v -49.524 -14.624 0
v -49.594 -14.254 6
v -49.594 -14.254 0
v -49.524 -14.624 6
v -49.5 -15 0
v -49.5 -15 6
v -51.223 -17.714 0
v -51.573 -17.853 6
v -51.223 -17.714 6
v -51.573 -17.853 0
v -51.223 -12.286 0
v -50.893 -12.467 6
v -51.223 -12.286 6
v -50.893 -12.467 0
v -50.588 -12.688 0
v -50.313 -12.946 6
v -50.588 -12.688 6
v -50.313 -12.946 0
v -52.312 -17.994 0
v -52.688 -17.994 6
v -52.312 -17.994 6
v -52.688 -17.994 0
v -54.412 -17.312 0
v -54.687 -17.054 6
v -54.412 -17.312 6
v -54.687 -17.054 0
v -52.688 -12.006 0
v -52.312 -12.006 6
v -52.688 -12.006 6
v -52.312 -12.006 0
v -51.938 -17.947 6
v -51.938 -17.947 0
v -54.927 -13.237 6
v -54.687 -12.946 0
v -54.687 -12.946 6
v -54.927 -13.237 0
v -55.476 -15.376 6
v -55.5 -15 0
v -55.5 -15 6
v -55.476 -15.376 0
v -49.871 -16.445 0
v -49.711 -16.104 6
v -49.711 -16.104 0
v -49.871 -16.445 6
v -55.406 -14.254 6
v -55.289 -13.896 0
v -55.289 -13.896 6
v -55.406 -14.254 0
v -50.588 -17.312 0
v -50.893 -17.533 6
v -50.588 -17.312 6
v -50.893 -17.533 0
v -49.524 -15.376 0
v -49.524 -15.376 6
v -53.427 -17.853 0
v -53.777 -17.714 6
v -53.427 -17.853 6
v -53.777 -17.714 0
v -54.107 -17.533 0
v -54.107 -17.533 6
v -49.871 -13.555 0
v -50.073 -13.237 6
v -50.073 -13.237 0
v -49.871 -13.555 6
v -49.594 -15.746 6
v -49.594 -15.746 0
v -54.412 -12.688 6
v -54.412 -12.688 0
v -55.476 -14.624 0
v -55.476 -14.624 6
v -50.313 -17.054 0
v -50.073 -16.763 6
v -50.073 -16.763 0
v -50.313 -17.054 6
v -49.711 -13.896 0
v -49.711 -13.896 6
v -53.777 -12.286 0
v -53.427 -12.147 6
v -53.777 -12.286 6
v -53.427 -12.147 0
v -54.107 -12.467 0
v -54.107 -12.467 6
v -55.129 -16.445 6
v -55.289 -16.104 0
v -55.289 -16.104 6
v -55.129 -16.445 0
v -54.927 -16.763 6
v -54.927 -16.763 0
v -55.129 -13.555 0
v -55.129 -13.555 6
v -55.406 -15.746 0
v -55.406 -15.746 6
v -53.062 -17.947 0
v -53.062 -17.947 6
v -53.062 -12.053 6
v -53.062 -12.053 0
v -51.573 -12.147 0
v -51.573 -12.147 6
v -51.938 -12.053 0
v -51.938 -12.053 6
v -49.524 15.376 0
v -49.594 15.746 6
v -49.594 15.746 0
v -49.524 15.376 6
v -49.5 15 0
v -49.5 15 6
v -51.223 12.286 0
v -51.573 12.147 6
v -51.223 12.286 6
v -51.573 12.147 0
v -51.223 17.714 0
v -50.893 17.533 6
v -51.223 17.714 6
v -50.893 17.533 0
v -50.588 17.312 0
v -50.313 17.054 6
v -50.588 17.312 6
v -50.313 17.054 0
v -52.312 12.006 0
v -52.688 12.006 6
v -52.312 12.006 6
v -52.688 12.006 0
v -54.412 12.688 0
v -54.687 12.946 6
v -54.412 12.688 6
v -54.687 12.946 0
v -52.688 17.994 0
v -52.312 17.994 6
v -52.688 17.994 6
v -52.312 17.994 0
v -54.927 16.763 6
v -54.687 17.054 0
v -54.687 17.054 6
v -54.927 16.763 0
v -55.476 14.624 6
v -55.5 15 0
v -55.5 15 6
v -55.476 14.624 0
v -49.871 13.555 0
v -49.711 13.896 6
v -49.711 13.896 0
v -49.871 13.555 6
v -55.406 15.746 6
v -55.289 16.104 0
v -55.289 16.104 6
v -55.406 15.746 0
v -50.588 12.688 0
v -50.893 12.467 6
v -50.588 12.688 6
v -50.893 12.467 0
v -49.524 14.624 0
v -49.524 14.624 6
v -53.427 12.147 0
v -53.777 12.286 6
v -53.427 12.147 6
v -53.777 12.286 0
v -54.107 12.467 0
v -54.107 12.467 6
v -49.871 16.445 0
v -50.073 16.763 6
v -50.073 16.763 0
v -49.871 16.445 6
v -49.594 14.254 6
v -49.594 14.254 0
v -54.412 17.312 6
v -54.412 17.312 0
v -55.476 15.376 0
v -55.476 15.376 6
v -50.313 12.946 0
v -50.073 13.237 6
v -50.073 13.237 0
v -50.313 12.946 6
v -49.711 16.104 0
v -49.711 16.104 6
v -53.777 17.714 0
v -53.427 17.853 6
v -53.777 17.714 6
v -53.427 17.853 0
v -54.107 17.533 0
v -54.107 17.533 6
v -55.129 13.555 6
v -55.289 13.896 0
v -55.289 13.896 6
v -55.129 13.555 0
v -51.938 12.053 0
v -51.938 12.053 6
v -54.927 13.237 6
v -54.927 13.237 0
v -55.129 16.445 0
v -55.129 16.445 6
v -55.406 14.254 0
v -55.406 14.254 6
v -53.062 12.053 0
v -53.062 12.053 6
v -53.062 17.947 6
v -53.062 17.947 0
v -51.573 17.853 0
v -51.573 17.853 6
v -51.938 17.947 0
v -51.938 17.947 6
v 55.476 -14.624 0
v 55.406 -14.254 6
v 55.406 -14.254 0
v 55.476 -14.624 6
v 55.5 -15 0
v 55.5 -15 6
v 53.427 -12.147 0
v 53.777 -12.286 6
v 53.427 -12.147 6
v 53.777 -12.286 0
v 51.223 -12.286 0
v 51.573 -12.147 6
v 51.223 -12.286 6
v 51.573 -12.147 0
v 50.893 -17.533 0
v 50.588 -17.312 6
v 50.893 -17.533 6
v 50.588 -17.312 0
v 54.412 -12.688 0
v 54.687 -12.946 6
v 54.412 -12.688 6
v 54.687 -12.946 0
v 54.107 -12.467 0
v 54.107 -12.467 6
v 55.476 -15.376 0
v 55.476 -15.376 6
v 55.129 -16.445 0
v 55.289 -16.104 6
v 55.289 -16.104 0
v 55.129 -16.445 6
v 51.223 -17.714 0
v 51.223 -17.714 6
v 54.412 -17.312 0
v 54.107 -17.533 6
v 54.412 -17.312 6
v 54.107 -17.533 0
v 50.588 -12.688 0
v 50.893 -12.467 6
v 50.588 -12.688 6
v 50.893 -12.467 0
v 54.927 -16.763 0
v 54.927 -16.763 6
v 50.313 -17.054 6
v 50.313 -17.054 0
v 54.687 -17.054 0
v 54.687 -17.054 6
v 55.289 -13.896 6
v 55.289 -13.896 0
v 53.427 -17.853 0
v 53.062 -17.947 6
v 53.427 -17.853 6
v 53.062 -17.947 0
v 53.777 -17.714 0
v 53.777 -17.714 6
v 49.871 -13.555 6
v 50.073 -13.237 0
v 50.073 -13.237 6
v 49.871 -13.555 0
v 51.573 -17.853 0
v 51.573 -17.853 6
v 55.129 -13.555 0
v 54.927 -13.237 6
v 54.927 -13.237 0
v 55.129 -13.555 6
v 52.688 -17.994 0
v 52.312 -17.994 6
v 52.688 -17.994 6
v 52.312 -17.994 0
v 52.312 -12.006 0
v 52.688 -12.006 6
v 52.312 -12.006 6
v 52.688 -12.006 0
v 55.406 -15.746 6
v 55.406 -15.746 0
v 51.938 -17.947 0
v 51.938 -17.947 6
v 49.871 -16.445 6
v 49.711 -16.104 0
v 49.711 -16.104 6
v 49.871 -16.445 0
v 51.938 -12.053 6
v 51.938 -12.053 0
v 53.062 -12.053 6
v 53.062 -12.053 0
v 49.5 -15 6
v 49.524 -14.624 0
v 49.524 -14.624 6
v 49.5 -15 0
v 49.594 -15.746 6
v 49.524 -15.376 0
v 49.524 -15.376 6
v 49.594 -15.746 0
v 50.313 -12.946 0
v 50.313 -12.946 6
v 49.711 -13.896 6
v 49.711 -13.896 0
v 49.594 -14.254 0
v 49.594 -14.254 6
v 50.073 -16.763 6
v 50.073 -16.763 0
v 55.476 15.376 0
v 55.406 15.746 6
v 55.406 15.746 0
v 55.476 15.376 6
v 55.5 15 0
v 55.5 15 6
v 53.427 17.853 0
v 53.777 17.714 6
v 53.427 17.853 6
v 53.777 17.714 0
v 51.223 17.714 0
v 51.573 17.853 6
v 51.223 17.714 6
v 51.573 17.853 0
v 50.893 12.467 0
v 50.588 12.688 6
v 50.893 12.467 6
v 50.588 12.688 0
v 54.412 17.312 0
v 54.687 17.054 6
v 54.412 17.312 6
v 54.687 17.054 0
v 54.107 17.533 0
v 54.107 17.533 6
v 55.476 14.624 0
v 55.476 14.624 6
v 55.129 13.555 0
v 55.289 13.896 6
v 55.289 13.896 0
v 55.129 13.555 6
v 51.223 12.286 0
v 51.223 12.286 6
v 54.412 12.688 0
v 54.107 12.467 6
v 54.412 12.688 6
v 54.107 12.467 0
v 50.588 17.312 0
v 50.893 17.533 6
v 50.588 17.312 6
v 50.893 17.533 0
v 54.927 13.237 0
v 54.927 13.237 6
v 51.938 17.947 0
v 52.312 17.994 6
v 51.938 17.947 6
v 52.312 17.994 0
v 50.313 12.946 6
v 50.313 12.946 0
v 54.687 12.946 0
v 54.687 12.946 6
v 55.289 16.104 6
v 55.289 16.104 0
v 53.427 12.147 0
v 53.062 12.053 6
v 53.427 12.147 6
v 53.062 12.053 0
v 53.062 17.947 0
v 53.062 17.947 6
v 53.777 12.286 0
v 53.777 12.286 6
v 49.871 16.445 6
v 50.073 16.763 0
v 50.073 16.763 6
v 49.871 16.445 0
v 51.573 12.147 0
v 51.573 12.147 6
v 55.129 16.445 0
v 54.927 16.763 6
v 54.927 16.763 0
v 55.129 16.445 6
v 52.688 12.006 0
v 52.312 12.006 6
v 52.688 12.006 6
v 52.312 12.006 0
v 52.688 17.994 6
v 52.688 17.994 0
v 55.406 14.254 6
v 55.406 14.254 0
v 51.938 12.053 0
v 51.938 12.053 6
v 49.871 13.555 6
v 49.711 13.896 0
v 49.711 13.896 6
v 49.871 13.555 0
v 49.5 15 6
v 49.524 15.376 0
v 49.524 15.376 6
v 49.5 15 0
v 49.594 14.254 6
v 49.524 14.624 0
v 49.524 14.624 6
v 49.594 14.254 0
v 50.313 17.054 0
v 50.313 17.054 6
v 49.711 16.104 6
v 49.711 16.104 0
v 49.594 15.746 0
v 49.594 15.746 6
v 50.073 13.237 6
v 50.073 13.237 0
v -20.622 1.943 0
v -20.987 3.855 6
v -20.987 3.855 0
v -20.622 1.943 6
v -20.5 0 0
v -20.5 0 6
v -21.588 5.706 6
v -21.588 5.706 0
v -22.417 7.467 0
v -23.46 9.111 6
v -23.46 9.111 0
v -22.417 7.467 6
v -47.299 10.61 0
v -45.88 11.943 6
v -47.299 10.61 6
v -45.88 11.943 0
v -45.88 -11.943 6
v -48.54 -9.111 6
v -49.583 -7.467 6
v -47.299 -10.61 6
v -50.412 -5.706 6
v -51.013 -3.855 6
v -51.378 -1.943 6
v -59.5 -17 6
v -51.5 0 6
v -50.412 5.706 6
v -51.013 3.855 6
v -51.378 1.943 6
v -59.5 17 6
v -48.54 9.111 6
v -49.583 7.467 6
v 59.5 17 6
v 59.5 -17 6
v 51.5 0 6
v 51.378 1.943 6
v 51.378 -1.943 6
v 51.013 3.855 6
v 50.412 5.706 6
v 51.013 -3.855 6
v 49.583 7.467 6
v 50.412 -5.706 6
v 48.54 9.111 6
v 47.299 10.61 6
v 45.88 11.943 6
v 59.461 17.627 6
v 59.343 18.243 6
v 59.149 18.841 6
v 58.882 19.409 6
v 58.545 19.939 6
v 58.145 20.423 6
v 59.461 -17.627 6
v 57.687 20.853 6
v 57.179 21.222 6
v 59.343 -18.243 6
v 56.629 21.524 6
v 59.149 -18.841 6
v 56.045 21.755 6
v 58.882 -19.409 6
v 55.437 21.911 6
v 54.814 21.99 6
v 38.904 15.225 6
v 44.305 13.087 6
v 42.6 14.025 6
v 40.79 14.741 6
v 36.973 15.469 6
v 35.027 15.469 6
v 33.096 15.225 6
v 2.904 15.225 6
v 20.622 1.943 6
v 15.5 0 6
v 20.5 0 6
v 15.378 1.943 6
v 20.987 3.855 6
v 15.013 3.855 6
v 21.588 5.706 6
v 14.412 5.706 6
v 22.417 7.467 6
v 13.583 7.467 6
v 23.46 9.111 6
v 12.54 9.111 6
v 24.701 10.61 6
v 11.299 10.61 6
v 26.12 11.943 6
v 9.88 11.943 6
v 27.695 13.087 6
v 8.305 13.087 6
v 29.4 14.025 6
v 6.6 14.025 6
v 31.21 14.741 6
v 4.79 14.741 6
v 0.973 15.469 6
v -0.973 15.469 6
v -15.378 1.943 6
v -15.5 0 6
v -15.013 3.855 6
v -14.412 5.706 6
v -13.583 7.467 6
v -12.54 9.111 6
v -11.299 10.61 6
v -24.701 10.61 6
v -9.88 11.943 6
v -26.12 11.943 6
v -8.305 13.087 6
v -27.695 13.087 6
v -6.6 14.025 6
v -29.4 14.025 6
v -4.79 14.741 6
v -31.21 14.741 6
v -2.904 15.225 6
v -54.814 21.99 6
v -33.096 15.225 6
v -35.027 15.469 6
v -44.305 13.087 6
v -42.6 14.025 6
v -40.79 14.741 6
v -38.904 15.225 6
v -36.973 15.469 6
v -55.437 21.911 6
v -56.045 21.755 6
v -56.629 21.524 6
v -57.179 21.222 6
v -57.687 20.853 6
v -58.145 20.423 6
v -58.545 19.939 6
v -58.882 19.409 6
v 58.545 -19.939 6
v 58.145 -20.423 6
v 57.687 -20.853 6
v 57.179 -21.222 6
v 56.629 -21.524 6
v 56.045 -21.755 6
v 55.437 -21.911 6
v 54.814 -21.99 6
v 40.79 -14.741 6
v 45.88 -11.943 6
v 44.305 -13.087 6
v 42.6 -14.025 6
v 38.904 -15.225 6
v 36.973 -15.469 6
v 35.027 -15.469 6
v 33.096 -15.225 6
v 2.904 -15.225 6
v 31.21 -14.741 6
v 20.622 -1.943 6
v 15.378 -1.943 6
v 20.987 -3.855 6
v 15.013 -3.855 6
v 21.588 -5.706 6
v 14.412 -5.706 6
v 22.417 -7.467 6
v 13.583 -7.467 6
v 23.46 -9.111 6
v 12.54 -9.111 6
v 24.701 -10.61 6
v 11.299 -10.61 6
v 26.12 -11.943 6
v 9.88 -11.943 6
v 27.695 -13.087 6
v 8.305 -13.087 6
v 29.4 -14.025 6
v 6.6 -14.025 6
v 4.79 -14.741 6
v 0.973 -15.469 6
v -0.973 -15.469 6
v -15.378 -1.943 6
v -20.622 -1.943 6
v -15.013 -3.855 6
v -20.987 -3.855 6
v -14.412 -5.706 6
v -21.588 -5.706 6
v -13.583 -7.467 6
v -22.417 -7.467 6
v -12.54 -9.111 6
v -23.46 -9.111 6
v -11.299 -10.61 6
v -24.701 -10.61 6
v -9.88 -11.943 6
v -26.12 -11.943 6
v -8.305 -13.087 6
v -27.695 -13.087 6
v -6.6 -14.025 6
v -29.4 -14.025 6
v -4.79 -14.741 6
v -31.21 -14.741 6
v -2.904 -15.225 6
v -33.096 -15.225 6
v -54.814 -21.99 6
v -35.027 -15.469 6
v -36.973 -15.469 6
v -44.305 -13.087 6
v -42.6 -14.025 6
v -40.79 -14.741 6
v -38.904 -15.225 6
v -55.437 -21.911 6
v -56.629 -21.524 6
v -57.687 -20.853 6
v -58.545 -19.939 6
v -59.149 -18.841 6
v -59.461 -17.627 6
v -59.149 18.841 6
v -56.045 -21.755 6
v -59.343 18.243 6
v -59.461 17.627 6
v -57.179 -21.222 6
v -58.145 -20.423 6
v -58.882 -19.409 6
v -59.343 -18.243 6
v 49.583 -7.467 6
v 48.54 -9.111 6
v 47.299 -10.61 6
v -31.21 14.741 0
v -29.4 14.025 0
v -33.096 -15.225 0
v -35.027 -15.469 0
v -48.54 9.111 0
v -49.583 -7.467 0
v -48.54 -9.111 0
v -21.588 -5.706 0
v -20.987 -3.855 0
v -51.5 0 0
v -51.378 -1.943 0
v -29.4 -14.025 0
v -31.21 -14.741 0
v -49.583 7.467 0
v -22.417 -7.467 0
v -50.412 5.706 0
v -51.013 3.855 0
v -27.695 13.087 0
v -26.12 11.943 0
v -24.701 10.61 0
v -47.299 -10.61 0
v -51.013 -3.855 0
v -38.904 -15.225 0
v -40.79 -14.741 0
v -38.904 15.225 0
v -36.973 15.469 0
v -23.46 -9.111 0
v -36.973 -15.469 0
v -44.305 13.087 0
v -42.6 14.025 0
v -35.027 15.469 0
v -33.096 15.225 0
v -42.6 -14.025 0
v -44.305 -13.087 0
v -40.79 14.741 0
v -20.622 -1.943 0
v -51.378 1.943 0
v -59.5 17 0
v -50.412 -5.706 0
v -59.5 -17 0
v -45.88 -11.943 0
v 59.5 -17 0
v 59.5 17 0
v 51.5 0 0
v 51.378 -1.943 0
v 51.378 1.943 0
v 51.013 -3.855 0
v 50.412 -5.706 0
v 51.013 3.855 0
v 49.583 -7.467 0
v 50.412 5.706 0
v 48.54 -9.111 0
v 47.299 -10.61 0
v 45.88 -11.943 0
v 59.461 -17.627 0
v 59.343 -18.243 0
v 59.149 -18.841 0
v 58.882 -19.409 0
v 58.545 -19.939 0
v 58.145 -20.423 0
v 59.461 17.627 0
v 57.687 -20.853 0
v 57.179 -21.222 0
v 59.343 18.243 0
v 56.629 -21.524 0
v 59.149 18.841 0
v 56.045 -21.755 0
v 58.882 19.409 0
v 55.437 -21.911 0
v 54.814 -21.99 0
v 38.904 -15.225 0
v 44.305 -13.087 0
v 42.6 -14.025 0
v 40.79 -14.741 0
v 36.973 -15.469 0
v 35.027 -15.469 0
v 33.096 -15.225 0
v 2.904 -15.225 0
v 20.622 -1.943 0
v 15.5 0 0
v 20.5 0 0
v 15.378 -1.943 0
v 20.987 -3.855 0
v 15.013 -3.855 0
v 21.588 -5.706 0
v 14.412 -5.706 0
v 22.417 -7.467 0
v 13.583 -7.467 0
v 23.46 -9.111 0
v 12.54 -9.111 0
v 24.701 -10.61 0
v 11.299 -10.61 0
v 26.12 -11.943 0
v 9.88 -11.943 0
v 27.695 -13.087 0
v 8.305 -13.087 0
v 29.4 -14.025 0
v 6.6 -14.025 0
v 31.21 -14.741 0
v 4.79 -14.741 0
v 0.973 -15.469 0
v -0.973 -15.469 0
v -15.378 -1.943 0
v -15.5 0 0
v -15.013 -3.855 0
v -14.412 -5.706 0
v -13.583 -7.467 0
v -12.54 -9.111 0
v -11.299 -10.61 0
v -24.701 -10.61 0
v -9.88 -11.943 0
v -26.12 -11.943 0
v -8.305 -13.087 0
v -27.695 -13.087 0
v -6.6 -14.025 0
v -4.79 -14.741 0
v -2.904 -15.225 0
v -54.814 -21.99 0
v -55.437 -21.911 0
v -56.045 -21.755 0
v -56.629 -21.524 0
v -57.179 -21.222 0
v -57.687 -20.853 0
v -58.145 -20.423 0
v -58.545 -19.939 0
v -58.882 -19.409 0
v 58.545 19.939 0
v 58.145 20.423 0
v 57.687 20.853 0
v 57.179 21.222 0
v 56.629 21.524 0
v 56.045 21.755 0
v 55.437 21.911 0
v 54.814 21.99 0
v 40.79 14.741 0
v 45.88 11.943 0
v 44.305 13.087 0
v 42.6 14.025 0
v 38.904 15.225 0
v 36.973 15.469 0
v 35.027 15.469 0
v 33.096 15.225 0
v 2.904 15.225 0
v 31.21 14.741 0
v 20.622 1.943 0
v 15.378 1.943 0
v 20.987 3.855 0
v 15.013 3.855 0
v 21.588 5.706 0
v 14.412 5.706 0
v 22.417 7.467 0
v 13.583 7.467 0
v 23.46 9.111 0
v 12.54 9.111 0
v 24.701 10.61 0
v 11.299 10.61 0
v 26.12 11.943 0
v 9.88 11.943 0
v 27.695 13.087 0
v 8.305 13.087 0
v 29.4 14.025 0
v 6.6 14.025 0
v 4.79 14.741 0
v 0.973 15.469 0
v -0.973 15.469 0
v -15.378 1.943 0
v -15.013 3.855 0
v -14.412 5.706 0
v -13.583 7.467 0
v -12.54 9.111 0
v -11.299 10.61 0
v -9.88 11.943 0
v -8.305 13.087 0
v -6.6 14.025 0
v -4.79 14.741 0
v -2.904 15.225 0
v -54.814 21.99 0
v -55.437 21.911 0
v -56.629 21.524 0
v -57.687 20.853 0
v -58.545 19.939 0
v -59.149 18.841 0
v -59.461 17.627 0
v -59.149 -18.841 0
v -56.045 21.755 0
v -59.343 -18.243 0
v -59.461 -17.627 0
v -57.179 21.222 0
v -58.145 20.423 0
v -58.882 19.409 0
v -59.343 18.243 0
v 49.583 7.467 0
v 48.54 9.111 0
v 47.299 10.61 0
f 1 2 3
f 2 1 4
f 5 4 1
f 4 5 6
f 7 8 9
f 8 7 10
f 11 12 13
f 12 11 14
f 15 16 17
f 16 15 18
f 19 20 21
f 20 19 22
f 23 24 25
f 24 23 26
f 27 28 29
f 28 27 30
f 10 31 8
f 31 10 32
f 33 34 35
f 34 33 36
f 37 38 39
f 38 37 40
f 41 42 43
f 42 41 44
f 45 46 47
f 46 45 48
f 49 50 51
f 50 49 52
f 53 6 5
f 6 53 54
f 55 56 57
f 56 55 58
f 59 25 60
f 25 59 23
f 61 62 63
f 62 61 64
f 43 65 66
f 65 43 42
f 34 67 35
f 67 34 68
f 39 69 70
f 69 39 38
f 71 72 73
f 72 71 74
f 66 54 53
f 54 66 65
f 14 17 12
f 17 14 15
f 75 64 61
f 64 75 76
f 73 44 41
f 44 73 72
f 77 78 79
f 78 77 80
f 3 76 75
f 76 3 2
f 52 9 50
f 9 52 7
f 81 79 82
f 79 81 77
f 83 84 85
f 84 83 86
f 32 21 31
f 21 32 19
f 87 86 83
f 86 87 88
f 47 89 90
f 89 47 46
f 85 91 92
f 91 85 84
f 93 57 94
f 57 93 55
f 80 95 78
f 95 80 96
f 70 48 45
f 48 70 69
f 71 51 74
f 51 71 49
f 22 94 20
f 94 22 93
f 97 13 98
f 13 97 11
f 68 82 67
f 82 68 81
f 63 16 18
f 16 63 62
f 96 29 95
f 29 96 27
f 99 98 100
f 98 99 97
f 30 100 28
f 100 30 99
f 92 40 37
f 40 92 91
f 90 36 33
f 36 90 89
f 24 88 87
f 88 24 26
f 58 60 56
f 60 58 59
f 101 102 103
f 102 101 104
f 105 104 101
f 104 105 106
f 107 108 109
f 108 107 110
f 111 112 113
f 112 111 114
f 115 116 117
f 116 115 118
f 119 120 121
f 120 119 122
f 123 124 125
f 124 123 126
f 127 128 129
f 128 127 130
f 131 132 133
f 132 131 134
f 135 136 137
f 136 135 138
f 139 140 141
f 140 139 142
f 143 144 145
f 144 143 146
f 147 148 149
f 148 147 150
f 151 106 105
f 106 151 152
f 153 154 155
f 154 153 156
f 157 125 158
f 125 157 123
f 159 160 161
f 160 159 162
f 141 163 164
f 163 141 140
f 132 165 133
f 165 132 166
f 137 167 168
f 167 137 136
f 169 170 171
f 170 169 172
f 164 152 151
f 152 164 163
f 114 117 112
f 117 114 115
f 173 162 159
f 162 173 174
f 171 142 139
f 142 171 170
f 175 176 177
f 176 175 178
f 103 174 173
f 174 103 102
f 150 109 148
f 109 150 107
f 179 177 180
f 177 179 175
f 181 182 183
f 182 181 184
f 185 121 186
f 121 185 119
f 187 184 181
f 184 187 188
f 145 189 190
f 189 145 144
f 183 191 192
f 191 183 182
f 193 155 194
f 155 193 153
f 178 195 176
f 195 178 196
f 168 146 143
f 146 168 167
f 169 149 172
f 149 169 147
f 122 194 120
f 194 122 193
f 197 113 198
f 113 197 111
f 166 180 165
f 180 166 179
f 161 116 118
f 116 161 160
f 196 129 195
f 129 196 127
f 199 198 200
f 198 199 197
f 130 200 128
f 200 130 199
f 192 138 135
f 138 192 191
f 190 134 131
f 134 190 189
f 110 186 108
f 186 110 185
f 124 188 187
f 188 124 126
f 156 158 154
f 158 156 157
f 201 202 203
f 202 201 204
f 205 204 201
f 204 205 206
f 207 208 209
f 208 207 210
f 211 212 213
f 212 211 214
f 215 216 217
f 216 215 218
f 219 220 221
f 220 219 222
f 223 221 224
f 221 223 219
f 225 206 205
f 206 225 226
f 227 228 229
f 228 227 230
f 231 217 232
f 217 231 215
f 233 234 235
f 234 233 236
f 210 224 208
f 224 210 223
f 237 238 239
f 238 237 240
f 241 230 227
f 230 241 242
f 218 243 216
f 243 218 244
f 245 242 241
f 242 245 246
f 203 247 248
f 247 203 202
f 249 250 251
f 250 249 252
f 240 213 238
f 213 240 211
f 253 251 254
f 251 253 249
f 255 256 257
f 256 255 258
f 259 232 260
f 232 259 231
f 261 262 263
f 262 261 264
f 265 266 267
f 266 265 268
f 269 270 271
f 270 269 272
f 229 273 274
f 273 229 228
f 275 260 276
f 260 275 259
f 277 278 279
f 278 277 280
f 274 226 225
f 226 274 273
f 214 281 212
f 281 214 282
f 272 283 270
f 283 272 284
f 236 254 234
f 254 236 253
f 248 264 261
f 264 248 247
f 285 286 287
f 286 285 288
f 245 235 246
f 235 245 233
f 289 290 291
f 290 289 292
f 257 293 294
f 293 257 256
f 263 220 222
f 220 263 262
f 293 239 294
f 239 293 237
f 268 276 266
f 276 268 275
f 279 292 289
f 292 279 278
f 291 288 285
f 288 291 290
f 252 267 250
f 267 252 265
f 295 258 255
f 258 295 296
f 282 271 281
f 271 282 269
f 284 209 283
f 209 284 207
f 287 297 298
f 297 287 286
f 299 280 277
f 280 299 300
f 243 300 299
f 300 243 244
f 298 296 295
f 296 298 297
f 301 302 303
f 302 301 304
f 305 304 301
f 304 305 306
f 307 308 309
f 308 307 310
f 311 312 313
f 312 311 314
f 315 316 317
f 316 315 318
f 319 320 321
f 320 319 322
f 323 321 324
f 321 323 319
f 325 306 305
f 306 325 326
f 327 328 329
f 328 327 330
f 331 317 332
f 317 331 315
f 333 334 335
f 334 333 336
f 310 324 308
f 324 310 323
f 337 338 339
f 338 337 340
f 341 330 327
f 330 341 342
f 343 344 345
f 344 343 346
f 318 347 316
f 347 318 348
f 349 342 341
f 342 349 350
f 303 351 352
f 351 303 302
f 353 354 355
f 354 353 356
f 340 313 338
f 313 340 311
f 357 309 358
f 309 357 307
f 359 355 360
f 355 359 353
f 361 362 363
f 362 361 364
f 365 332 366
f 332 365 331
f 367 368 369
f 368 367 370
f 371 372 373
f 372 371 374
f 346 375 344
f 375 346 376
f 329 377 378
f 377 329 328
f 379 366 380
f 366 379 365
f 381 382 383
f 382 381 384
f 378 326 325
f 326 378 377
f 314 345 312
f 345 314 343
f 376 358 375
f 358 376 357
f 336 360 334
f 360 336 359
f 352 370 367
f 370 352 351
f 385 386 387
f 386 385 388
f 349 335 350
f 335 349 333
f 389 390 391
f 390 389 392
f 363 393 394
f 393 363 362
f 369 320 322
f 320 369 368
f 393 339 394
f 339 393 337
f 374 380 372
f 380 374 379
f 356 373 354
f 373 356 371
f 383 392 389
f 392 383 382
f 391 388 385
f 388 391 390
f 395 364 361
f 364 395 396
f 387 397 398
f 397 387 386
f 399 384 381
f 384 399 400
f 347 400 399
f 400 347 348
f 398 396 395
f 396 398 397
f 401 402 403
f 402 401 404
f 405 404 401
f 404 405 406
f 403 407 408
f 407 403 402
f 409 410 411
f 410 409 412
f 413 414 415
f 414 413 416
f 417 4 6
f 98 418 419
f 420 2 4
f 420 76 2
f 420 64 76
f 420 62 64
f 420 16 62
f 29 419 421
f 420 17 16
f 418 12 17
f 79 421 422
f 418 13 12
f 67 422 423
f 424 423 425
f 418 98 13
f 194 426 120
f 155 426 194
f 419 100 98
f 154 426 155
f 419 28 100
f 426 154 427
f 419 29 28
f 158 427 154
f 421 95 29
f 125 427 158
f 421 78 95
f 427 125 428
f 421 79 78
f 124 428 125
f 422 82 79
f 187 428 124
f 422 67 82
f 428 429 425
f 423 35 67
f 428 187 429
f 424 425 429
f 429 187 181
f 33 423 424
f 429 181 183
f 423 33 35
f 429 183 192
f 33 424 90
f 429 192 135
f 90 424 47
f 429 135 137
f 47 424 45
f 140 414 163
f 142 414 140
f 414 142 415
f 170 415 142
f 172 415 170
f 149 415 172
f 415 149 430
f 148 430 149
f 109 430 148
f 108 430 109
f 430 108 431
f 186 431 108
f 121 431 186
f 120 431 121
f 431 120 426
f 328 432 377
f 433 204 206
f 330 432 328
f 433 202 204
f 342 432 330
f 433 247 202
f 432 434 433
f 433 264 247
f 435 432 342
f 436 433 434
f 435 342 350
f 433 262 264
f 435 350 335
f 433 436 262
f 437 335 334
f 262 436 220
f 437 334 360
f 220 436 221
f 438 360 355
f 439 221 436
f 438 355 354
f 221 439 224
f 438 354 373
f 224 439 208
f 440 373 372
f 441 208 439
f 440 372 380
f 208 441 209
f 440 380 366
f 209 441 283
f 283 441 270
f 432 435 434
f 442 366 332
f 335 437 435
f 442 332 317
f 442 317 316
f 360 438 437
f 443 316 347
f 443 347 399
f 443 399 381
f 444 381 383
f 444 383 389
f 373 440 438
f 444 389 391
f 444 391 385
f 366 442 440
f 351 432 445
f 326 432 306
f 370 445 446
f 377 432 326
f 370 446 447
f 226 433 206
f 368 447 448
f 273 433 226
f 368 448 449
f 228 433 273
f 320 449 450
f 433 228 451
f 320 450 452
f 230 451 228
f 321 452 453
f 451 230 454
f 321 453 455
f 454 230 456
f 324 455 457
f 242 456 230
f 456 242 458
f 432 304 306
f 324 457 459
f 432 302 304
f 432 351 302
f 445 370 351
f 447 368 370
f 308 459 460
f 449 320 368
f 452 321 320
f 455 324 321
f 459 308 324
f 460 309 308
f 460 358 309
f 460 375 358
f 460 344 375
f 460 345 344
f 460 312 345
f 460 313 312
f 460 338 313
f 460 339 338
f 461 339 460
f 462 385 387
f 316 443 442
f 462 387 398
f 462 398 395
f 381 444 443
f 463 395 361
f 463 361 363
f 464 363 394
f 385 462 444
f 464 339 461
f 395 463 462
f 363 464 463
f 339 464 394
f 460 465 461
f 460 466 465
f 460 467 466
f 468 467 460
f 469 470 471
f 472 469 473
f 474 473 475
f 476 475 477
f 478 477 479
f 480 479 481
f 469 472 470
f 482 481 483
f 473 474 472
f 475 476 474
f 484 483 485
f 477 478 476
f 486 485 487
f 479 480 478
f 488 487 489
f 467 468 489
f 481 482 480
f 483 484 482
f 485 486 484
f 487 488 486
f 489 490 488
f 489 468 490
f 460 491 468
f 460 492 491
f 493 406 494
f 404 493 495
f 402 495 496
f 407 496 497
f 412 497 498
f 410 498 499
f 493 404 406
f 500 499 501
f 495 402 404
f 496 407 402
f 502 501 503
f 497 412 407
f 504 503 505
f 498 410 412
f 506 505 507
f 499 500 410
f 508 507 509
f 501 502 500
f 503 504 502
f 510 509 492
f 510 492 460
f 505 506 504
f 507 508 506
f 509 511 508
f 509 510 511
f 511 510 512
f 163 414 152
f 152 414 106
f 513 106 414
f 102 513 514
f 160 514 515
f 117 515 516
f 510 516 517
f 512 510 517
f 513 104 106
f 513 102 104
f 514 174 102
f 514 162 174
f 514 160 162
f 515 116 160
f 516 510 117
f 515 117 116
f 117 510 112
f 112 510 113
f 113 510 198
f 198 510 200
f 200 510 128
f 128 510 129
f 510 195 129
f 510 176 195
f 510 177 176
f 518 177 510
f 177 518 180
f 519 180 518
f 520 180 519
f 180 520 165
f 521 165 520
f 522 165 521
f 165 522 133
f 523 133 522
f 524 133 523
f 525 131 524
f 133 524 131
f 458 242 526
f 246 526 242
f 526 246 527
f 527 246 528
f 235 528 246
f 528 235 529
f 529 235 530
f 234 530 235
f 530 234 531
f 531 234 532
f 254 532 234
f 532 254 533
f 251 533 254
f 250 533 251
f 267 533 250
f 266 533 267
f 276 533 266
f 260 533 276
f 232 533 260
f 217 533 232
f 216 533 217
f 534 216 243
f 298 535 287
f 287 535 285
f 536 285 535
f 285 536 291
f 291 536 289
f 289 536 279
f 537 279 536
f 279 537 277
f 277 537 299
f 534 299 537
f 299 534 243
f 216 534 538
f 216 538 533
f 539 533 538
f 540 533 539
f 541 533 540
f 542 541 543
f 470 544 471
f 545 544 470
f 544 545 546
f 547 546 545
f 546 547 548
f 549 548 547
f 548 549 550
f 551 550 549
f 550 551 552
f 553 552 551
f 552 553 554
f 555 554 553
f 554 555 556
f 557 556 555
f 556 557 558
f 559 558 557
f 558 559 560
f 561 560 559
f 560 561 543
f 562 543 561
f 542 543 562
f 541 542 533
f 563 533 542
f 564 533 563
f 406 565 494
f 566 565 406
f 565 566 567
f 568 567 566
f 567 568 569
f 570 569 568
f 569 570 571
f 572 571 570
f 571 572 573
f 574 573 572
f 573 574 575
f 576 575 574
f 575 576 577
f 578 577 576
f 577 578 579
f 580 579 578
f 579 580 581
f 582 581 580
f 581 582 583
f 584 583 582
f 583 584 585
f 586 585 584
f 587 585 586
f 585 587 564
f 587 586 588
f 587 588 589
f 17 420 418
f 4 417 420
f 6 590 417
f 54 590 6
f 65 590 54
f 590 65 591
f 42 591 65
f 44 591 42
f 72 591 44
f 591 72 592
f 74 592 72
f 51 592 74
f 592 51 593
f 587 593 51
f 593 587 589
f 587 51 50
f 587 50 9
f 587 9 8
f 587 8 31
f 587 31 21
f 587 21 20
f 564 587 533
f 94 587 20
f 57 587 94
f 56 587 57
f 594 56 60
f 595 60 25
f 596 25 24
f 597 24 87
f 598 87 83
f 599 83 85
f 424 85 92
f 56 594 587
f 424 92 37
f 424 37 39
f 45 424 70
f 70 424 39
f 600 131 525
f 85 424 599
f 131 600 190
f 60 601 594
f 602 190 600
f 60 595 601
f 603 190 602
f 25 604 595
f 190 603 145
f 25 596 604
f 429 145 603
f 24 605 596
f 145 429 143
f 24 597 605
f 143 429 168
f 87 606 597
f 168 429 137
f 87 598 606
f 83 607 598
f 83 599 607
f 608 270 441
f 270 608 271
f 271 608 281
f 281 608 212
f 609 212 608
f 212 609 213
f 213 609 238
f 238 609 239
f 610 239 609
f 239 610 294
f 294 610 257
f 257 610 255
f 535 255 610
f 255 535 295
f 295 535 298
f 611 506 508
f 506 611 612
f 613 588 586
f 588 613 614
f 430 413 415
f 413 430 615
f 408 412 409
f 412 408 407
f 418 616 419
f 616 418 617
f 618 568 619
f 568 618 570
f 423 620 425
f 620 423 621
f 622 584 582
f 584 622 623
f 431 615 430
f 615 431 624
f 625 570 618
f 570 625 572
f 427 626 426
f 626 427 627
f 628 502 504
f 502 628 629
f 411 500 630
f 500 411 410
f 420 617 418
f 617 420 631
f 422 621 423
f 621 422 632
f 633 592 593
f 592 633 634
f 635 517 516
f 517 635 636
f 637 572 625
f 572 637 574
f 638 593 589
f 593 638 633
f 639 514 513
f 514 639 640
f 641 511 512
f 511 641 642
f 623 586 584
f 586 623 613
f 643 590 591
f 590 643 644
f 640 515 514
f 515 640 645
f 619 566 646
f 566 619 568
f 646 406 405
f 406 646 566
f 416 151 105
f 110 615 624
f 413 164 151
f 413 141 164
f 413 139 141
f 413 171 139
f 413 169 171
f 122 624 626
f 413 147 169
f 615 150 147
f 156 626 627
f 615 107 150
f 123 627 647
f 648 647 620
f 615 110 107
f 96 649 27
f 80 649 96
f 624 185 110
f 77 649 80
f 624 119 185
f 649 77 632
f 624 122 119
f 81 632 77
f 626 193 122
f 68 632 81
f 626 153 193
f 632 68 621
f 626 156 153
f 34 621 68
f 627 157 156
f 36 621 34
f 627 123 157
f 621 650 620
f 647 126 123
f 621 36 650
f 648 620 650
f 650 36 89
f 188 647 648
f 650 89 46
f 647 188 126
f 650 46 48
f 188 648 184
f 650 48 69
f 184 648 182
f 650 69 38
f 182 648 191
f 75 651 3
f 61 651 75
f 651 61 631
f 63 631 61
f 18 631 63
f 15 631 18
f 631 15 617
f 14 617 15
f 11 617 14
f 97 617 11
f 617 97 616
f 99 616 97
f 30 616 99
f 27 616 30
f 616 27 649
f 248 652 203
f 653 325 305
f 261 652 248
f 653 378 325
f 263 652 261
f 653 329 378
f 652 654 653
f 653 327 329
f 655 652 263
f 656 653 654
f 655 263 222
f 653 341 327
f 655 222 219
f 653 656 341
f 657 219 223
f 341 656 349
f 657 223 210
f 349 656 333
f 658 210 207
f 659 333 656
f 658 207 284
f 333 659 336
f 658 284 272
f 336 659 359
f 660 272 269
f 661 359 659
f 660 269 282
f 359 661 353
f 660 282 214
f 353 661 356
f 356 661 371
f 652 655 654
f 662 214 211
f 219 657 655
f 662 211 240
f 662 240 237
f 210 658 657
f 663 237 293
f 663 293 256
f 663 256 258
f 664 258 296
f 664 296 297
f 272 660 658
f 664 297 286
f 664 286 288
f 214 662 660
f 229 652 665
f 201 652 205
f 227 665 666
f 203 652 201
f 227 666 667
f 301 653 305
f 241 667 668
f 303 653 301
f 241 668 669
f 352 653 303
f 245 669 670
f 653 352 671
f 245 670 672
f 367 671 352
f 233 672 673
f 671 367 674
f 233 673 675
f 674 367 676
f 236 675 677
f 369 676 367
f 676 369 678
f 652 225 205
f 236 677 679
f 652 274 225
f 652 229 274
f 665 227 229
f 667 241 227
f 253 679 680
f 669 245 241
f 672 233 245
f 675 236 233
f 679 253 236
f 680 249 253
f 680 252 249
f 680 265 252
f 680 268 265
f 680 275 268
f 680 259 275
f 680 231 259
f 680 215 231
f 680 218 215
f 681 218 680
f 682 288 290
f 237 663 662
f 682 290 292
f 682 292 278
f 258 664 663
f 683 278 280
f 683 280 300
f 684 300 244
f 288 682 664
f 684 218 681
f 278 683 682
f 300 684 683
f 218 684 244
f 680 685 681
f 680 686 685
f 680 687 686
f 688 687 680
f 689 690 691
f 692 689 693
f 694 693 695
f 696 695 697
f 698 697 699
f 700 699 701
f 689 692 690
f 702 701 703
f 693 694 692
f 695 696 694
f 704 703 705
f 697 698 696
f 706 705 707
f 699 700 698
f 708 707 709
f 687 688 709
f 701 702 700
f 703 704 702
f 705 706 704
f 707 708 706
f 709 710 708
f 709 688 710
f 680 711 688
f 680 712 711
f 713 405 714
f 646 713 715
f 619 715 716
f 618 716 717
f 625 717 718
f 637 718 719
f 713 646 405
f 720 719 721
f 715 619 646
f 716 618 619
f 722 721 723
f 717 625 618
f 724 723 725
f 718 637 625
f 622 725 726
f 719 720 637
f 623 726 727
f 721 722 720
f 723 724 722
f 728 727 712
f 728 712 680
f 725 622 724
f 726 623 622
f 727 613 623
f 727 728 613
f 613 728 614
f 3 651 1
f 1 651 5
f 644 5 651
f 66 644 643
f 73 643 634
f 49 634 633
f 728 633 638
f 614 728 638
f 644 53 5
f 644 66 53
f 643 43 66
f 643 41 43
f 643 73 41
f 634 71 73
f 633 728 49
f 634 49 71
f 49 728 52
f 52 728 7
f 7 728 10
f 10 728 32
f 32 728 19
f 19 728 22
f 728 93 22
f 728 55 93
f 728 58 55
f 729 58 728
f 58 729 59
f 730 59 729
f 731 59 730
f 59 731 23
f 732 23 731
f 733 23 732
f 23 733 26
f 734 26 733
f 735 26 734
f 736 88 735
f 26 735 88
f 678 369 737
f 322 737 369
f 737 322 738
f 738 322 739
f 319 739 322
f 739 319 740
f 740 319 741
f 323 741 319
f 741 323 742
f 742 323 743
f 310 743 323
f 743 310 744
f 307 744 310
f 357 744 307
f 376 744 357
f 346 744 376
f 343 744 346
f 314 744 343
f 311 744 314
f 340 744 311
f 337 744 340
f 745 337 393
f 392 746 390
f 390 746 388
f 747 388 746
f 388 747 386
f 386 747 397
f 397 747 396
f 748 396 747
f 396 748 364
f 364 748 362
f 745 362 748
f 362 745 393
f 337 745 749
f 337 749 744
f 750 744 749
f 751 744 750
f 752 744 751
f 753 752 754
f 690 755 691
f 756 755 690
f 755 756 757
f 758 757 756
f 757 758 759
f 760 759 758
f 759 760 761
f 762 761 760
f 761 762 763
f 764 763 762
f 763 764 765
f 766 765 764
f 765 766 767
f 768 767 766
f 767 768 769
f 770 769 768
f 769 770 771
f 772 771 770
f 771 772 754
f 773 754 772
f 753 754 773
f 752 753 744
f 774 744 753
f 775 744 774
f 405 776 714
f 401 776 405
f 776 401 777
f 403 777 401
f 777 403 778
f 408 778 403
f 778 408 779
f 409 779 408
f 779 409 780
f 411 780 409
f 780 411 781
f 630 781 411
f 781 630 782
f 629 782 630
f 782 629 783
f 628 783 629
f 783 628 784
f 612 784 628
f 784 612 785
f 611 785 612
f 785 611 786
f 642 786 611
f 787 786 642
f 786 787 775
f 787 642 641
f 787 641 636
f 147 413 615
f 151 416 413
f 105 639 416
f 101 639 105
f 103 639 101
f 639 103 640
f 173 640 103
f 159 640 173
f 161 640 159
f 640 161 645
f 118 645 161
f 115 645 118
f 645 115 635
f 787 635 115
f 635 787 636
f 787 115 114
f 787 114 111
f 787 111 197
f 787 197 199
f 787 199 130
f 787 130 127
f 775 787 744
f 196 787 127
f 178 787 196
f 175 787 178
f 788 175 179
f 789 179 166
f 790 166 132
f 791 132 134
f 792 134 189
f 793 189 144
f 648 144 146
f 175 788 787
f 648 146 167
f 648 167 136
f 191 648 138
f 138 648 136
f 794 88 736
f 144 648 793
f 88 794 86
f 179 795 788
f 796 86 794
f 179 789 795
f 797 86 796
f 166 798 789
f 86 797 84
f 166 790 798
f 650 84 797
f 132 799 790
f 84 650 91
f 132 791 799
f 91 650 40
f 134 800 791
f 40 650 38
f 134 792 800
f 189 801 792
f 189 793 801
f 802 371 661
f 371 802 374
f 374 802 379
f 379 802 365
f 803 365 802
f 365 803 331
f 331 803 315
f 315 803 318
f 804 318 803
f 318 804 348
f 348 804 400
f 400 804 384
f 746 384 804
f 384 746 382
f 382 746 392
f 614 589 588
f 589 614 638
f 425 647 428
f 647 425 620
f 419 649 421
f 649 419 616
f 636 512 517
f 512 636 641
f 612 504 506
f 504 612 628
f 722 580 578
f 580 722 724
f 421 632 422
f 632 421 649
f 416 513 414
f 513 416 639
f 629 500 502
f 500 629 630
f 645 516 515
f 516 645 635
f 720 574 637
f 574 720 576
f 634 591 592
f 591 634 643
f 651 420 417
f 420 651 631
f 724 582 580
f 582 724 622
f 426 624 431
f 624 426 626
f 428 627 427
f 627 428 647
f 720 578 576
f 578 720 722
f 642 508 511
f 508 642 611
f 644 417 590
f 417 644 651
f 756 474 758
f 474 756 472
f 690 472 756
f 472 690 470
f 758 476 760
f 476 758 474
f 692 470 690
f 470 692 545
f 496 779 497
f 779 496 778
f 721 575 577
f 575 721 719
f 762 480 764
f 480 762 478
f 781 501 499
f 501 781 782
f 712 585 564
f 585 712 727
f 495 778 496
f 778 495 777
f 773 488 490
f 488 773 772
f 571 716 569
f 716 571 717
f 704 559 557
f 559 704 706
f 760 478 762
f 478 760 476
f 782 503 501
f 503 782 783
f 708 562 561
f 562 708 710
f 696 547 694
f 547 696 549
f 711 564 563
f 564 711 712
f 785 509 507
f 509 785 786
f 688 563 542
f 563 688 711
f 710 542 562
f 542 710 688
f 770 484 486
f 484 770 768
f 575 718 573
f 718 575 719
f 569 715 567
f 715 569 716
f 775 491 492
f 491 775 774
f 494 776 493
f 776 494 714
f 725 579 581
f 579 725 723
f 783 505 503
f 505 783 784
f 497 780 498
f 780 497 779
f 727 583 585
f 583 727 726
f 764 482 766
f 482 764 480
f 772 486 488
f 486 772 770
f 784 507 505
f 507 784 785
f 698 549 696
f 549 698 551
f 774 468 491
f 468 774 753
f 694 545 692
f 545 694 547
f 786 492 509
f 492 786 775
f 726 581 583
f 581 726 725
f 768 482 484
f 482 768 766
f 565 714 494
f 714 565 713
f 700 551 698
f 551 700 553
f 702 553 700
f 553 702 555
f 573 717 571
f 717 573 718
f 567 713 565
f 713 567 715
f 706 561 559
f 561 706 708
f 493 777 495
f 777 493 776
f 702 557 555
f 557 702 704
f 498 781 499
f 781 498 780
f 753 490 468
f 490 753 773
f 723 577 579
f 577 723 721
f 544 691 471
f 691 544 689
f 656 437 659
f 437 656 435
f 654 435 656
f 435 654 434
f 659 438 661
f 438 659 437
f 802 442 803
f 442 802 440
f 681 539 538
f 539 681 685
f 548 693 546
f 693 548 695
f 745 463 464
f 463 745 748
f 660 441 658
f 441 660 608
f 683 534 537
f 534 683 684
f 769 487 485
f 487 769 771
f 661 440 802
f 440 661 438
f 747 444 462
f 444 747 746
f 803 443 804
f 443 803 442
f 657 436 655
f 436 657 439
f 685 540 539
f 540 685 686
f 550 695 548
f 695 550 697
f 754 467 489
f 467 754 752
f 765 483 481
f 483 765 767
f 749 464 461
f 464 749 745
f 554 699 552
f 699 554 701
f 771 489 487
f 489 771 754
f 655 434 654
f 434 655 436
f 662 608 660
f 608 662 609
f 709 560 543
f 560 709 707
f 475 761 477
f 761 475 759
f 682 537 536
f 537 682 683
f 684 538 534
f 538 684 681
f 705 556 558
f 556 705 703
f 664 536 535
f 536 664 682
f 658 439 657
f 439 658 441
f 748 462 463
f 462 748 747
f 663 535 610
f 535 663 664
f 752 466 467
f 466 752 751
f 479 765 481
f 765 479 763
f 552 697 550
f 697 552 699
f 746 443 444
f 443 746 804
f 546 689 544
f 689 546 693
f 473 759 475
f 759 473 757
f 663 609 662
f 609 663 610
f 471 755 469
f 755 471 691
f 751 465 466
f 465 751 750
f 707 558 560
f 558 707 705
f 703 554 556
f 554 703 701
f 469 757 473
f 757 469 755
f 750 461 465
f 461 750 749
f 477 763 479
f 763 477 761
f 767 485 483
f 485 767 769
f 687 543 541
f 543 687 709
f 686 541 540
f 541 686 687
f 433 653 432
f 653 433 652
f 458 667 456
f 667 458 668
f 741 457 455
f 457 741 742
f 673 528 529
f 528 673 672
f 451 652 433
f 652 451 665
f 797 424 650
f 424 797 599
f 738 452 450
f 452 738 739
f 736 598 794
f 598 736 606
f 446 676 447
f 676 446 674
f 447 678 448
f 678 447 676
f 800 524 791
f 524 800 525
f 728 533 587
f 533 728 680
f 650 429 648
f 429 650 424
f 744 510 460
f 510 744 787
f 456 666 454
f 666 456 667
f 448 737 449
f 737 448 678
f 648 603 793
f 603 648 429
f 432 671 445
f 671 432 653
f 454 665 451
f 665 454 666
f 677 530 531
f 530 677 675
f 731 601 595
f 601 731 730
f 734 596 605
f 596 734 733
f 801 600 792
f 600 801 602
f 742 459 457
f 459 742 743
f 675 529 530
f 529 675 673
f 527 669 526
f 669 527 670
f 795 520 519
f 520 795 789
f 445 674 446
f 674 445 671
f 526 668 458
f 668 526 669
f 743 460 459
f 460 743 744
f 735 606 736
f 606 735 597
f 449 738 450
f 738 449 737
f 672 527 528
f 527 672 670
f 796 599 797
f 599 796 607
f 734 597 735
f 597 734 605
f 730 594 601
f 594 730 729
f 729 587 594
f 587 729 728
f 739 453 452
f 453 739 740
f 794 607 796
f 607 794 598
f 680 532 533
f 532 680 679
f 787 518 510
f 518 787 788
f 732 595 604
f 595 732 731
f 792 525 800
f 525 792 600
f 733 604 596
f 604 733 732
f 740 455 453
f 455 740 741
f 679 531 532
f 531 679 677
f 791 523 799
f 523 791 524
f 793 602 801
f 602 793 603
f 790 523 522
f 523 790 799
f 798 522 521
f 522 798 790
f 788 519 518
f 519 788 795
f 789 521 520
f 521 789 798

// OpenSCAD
$fn = 50;


difference() {
	union() {
		hull() {
			translate(v = [-54.5000000000, 17.0000000000, 0]) {
				cylinder(h = 6, r = 5);
			}
			translate(v = [54.5000000000, 17.0000000000, 0]) {
				cylinder(h = 6, r = 5);
			}
			translate(v = [-54.5000000000, -17.0000000000, 0]) {
				cylinder(h = 6, r = 5);
			}
			translate(v = [54.5000000000, -17.0000000000, 0]) {
				cylinder(h = 6, r = 5);
			}
		}
	}
	union() {
		#translate(v = [-52.5000000000, -15.0000000000, -100.0000000000]) {
			cylinder(h = 200, r = 3.0000000000);
		}
		#translate(v = [-52.5000000000, 15.0000000000, -100.0000000000]) {
			cylinder(h = 200, r = 3.0000000000);
		}
		#translate(v = [52.5000000000, -15.0000000000, -100.0000000000]) {
			cylinder(h = 200, r = 3.0000000000);
		}
		#translate(v = [52.5000000000, 15.0000000000, -100.0000000000]) {
			cylinder(h = 200, r = 3.0000000000);
		}
		#translate(v = [-36.0000000000, 0, 0]) {
			cylinder(h = 6, r = 15.5000000000);
		}
		#cylinder(h = 6, r = 15.5000000000);
		#translate(v = [36.0000000000, 0, 0]) {
			cylinder(h = 6, r = 15.5000000000);
		}
	}
}
